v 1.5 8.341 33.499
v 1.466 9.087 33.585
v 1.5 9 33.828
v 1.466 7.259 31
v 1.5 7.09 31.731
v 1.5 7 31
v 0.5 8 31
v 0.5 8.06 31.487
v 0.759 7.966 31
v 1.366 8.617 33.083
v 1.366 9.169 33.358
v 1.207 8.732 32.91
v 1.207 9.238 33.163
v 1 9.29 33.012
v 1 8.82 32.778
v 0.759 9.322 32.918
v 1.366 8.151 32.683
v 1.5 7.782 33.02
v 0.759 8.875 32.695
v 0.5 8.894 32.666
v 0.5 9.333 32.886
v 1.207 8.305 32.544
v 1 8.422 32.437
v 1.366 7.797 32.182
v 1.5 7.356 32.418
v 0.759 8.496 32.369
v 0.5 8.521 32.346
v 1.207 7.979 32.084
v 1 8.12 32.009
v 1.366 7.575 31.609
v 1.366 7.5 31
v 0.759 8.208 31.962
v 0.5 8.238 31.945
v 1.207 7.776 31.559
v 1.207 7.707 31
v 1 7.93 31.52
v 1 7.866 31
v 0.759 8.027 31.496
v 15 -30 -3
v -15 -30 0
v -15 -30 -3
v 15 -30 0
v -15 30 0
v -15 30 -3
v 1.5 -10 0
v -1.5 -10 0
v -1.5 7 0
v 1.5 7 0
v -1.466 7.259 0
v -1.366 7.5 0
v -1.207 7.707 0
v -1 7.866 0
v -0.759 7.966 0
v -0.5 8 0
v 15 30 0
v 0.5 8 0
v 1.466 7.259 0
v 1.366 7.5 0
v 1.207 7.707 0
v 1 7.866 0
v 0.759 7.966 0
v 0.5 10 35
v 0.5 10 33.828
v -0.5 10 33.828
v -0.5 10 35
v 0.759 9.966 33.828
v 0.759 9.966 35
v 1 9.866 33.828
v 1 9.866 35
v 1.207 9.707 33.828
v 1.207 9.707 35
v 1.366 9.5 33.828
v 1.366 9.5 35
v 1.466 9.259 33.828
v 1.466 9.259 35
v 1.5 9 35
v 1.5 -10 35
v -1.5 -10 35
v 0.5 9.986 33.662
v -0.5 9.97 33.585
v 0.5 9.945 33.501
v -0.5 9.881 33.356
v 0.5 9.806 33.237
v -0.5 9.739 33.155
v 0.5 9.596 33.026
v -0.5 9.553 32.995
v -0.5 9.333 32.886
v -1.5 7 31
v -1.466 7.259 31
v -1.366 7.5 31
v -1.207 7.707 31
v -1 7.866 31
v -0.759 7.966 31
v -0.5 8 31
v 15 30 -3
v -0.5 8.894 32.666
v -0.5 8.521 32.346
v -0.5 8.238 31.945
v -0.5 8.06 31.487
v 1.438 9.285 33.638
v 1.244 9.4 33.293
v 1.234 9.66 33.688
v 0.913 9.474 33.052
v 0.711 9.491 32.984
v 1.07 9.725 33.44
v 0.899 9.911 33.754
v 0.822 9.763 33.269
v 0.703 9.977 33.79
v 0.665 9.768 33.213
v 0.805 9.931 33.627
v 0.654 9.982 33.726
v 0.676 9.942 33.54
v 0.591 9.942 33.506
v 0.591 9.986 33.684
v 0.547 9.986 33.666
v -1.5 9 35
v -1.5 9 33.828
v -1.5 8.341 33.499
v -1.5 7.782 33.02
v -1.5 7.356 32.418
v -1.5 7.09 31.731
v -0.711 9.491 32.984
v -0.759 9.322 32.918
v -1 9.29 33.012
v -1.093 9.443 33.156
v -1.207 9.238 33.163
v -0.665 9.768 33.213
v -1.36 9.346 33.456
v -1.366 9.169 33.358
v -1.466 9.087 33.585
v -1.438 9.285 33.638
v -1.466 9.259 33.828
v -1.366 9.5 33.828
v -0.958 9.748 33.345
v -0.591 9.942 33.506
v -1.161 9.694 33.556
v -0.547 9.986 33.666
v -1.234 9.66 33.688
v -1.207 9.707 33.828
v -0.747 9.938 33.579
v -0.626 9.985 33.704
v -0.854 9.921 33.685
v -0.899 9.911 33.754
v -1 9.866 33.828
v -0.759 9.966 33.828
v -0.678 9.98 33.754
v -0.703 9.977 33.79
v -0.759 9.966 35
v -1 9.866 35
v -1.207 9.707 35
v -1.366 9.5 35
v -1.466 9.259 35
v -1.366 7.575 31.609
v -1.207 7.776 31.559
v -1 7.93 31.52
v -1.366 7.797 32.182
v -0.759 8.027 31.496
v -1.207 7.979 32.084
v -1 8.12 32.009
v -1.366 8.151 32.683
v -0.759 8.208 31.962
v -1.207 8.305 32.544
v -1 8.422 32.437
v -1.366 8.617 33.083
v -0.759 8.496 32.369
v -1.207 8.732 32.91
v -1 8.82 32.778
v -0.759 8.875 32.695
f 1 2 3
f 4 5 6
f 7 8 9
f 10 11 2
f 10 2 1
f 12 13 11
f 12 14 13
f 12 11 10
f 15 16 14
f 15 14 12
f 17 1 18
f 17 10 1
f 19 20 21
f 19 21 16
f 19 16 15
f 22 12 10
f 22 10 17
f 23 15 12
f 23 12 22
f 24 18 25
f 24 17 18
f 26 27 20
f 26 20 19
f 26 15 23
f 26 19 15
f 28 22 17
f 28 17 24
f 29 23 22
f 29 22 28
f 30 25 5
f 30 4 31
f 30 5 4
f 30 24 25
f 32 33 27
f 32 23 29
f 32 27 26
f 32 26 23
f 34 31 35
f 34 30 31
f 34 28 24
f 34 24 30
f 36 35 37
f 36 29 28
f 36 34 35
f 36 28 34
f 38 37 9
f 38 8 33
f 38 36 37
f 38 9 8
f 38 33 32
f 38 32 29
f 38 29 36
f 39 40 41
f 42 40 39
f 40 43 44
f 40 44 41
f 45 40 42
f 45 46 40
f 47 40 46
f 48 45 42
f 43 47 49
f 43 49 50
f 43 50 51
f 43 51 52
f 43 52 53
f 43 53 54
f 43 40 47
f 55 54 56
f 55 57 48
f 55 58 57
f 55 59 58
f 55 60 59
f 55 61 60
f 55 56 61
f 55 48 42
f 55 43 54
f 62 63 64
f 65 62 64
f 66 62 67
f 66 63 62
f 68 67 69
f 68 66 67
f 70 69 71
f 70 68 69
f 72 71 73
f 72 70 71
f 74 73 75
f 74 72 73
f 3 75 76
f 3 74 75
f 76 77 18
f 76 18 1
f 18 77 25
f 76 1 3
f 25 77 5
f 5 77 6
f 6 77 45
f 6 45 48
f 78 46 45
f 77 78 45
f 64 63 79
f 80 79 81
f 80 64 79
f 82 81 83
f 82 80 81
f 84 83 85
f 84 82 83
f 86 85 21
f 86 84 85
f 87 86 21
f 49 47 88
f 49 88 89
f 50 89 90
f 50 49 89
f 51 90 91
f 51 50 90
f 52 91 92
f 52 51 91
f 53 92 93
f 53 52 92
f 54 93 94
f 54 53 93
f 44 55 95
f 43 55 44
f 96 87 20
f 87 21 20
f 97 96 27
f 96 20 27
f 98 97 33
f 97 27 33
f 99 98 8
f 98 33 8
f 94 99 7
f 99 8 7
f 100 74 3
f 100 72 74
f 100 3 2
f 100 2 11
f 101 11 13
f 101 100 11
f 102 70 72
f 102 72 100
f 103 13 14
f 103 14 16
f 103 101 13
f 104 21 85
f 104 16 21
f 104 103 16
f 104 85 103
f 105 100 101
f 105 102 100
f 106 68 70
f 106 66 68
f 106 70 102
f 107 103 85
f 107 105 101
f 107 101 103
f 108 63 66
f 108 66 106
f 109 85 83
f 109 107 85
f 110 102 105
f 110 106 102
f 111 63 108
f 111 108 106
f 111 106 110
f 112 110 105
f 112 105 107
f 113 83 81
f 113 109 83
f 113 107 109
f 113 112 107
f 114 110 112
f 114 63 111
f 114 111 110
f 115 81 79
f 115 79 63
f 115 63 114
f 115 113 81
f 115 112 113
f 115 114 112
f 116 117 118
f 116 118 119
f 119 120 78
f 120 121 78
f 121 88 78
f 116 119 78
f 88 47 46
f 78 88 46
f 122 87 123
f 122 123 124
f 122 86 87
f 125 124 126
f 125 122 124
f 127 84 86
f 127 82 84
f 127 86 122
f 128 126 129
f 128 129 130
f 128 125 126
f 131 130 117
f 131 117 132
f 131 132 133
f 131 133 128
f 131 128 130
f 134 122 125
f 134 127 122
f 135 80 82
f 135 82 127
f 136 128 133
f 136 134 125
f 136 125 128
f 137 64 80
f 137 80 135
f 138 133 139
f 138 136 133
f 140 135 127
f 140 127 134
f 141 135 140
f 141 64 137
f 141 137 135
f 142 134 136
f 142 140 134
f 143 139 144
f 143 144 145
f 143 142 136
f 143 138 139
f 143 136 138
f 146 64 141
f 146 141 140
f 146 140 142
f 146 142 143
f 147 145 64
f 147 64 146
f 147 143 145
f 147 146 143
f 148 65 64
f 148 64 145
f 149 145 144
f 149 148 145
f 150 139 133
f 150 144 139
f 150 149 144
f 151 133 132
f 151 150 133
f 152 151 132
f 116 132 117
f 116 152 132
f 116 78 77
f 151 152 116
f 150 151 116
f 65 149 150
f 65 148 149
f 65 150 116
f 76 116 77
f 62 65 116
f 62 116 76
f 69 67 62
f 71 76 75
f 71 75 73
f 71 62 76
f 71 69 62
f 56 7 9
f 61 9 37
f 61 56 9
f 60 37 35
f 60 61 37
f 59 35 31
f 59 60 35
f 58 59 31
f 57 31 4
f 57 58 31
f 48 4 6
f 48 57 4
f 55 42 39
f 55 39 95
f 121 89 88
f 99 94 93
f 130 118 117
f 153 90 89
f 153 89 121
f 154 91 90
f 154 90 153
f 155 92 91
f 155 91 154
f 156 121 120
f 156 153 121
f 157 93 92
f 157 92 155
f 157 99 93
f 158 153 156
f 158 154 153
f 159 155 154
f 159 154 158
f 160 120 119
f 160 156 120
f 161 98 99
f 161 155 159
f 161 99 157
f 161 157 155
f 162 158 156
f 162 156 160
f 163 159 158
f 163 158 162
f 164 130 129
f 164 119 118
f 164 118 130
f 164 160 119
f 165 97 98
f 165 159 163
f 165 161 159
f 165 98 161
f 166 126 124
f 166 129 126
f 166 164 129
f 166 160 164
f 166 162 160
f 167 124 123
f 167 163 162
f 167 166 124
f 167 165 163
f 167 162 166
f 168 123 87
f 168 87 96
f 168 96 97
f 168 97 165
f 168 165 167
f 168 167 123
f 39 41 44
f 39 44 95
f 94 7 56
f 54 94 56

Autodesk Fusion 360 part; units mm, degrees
sketch "Sketch1" plane through (0, 0, 0) normal (0, 0, 1) x (1, 0, 0)
  line L0 (15, 30) -> (-15, 30)
  line L1 (-15, 30) -> (-15, -30)
  line L2 (-15, -30) -> (15, -30)
  line L3 (15, -30) -> (15, 30)
  line L4 (15, 30) -> (-15, -30) construction
  line L5 (-15, 30) -> (15, -30) construction
  line L6 (1.5, 10) -> (-1.5, 10)
  line L7 (-1.5, 10) -> (-1.5, -10)
  line L8 (-1.5, -10) -> (1.5, -10)
  line L9 (1.5, -10) -> (1.5, 10)
  line L10 (1.5, 10) -> (-1.5, -10) construction
  line L11 (-1.5, 10) -> (1.5, -10) construction
  dimension "d1" = 60
  dimension "d2" = 30
  dimension "d3" = 20
  dimension "d4" = 3
extrude "Extrude1" add sketch "Sketch1" against normal blind 3 contours L0 L1 L2 L3 | L6 L7 L8 L9
extrude "Extrude2" add sketch "Sketch1" along normal blind 35 contours L6 L7 L8 L9
sketch "Sketch2" plane through (0, 0, 0) normal (1, 0, 0) x (0, 0, -1)
sketch "Sketch3" plane through (1.5, 0, 0) normal (1, 0, 0) x (0, 0, -1)
  line L0 (0, -10) -> (0, 10)
  line L1 (0, 10) -> (-35, 10)
  line L2 (-35, 10) -> (-35, -10)
  line L3 (-35, -10) -> (0, -10)
  line L4 (0, 10) -> (-33, 10)
  line L5 (-33, 10) -> (-33, 8) construction
  line L6 (-33, 8) -> (0, 8)
  line L7 (0, 8) -> (0, 10)
  arc A0 (-33, 10) -> (-31, 8) centre (-31, 10) ccw
  dimension "d9" = 2
  dimension "d10" = 33
  dimension "d15" = 4
extrude "Extrude3" cut sketch "Sketch3" against normal through all contours L0 L1 L4 L6 L7 A0
fillet "Fillet4" radius 1 2 edges at (1.5, 8, 15.5) (1.5, 8.5858, 32.4142)
fillet "Fillet5" radius 1 2 edges at (-1.5, 8.5858, 32.4142) (-1.5, 8, 15.5)
fillet "Fillet6" radius 1 5 edges at (-1.5, 10, 34.5) (-1.2071, 10, 33.2929) (0, 10, 33) (1.2071, 10, 33.2929) (1.5, 10, 34.5)
